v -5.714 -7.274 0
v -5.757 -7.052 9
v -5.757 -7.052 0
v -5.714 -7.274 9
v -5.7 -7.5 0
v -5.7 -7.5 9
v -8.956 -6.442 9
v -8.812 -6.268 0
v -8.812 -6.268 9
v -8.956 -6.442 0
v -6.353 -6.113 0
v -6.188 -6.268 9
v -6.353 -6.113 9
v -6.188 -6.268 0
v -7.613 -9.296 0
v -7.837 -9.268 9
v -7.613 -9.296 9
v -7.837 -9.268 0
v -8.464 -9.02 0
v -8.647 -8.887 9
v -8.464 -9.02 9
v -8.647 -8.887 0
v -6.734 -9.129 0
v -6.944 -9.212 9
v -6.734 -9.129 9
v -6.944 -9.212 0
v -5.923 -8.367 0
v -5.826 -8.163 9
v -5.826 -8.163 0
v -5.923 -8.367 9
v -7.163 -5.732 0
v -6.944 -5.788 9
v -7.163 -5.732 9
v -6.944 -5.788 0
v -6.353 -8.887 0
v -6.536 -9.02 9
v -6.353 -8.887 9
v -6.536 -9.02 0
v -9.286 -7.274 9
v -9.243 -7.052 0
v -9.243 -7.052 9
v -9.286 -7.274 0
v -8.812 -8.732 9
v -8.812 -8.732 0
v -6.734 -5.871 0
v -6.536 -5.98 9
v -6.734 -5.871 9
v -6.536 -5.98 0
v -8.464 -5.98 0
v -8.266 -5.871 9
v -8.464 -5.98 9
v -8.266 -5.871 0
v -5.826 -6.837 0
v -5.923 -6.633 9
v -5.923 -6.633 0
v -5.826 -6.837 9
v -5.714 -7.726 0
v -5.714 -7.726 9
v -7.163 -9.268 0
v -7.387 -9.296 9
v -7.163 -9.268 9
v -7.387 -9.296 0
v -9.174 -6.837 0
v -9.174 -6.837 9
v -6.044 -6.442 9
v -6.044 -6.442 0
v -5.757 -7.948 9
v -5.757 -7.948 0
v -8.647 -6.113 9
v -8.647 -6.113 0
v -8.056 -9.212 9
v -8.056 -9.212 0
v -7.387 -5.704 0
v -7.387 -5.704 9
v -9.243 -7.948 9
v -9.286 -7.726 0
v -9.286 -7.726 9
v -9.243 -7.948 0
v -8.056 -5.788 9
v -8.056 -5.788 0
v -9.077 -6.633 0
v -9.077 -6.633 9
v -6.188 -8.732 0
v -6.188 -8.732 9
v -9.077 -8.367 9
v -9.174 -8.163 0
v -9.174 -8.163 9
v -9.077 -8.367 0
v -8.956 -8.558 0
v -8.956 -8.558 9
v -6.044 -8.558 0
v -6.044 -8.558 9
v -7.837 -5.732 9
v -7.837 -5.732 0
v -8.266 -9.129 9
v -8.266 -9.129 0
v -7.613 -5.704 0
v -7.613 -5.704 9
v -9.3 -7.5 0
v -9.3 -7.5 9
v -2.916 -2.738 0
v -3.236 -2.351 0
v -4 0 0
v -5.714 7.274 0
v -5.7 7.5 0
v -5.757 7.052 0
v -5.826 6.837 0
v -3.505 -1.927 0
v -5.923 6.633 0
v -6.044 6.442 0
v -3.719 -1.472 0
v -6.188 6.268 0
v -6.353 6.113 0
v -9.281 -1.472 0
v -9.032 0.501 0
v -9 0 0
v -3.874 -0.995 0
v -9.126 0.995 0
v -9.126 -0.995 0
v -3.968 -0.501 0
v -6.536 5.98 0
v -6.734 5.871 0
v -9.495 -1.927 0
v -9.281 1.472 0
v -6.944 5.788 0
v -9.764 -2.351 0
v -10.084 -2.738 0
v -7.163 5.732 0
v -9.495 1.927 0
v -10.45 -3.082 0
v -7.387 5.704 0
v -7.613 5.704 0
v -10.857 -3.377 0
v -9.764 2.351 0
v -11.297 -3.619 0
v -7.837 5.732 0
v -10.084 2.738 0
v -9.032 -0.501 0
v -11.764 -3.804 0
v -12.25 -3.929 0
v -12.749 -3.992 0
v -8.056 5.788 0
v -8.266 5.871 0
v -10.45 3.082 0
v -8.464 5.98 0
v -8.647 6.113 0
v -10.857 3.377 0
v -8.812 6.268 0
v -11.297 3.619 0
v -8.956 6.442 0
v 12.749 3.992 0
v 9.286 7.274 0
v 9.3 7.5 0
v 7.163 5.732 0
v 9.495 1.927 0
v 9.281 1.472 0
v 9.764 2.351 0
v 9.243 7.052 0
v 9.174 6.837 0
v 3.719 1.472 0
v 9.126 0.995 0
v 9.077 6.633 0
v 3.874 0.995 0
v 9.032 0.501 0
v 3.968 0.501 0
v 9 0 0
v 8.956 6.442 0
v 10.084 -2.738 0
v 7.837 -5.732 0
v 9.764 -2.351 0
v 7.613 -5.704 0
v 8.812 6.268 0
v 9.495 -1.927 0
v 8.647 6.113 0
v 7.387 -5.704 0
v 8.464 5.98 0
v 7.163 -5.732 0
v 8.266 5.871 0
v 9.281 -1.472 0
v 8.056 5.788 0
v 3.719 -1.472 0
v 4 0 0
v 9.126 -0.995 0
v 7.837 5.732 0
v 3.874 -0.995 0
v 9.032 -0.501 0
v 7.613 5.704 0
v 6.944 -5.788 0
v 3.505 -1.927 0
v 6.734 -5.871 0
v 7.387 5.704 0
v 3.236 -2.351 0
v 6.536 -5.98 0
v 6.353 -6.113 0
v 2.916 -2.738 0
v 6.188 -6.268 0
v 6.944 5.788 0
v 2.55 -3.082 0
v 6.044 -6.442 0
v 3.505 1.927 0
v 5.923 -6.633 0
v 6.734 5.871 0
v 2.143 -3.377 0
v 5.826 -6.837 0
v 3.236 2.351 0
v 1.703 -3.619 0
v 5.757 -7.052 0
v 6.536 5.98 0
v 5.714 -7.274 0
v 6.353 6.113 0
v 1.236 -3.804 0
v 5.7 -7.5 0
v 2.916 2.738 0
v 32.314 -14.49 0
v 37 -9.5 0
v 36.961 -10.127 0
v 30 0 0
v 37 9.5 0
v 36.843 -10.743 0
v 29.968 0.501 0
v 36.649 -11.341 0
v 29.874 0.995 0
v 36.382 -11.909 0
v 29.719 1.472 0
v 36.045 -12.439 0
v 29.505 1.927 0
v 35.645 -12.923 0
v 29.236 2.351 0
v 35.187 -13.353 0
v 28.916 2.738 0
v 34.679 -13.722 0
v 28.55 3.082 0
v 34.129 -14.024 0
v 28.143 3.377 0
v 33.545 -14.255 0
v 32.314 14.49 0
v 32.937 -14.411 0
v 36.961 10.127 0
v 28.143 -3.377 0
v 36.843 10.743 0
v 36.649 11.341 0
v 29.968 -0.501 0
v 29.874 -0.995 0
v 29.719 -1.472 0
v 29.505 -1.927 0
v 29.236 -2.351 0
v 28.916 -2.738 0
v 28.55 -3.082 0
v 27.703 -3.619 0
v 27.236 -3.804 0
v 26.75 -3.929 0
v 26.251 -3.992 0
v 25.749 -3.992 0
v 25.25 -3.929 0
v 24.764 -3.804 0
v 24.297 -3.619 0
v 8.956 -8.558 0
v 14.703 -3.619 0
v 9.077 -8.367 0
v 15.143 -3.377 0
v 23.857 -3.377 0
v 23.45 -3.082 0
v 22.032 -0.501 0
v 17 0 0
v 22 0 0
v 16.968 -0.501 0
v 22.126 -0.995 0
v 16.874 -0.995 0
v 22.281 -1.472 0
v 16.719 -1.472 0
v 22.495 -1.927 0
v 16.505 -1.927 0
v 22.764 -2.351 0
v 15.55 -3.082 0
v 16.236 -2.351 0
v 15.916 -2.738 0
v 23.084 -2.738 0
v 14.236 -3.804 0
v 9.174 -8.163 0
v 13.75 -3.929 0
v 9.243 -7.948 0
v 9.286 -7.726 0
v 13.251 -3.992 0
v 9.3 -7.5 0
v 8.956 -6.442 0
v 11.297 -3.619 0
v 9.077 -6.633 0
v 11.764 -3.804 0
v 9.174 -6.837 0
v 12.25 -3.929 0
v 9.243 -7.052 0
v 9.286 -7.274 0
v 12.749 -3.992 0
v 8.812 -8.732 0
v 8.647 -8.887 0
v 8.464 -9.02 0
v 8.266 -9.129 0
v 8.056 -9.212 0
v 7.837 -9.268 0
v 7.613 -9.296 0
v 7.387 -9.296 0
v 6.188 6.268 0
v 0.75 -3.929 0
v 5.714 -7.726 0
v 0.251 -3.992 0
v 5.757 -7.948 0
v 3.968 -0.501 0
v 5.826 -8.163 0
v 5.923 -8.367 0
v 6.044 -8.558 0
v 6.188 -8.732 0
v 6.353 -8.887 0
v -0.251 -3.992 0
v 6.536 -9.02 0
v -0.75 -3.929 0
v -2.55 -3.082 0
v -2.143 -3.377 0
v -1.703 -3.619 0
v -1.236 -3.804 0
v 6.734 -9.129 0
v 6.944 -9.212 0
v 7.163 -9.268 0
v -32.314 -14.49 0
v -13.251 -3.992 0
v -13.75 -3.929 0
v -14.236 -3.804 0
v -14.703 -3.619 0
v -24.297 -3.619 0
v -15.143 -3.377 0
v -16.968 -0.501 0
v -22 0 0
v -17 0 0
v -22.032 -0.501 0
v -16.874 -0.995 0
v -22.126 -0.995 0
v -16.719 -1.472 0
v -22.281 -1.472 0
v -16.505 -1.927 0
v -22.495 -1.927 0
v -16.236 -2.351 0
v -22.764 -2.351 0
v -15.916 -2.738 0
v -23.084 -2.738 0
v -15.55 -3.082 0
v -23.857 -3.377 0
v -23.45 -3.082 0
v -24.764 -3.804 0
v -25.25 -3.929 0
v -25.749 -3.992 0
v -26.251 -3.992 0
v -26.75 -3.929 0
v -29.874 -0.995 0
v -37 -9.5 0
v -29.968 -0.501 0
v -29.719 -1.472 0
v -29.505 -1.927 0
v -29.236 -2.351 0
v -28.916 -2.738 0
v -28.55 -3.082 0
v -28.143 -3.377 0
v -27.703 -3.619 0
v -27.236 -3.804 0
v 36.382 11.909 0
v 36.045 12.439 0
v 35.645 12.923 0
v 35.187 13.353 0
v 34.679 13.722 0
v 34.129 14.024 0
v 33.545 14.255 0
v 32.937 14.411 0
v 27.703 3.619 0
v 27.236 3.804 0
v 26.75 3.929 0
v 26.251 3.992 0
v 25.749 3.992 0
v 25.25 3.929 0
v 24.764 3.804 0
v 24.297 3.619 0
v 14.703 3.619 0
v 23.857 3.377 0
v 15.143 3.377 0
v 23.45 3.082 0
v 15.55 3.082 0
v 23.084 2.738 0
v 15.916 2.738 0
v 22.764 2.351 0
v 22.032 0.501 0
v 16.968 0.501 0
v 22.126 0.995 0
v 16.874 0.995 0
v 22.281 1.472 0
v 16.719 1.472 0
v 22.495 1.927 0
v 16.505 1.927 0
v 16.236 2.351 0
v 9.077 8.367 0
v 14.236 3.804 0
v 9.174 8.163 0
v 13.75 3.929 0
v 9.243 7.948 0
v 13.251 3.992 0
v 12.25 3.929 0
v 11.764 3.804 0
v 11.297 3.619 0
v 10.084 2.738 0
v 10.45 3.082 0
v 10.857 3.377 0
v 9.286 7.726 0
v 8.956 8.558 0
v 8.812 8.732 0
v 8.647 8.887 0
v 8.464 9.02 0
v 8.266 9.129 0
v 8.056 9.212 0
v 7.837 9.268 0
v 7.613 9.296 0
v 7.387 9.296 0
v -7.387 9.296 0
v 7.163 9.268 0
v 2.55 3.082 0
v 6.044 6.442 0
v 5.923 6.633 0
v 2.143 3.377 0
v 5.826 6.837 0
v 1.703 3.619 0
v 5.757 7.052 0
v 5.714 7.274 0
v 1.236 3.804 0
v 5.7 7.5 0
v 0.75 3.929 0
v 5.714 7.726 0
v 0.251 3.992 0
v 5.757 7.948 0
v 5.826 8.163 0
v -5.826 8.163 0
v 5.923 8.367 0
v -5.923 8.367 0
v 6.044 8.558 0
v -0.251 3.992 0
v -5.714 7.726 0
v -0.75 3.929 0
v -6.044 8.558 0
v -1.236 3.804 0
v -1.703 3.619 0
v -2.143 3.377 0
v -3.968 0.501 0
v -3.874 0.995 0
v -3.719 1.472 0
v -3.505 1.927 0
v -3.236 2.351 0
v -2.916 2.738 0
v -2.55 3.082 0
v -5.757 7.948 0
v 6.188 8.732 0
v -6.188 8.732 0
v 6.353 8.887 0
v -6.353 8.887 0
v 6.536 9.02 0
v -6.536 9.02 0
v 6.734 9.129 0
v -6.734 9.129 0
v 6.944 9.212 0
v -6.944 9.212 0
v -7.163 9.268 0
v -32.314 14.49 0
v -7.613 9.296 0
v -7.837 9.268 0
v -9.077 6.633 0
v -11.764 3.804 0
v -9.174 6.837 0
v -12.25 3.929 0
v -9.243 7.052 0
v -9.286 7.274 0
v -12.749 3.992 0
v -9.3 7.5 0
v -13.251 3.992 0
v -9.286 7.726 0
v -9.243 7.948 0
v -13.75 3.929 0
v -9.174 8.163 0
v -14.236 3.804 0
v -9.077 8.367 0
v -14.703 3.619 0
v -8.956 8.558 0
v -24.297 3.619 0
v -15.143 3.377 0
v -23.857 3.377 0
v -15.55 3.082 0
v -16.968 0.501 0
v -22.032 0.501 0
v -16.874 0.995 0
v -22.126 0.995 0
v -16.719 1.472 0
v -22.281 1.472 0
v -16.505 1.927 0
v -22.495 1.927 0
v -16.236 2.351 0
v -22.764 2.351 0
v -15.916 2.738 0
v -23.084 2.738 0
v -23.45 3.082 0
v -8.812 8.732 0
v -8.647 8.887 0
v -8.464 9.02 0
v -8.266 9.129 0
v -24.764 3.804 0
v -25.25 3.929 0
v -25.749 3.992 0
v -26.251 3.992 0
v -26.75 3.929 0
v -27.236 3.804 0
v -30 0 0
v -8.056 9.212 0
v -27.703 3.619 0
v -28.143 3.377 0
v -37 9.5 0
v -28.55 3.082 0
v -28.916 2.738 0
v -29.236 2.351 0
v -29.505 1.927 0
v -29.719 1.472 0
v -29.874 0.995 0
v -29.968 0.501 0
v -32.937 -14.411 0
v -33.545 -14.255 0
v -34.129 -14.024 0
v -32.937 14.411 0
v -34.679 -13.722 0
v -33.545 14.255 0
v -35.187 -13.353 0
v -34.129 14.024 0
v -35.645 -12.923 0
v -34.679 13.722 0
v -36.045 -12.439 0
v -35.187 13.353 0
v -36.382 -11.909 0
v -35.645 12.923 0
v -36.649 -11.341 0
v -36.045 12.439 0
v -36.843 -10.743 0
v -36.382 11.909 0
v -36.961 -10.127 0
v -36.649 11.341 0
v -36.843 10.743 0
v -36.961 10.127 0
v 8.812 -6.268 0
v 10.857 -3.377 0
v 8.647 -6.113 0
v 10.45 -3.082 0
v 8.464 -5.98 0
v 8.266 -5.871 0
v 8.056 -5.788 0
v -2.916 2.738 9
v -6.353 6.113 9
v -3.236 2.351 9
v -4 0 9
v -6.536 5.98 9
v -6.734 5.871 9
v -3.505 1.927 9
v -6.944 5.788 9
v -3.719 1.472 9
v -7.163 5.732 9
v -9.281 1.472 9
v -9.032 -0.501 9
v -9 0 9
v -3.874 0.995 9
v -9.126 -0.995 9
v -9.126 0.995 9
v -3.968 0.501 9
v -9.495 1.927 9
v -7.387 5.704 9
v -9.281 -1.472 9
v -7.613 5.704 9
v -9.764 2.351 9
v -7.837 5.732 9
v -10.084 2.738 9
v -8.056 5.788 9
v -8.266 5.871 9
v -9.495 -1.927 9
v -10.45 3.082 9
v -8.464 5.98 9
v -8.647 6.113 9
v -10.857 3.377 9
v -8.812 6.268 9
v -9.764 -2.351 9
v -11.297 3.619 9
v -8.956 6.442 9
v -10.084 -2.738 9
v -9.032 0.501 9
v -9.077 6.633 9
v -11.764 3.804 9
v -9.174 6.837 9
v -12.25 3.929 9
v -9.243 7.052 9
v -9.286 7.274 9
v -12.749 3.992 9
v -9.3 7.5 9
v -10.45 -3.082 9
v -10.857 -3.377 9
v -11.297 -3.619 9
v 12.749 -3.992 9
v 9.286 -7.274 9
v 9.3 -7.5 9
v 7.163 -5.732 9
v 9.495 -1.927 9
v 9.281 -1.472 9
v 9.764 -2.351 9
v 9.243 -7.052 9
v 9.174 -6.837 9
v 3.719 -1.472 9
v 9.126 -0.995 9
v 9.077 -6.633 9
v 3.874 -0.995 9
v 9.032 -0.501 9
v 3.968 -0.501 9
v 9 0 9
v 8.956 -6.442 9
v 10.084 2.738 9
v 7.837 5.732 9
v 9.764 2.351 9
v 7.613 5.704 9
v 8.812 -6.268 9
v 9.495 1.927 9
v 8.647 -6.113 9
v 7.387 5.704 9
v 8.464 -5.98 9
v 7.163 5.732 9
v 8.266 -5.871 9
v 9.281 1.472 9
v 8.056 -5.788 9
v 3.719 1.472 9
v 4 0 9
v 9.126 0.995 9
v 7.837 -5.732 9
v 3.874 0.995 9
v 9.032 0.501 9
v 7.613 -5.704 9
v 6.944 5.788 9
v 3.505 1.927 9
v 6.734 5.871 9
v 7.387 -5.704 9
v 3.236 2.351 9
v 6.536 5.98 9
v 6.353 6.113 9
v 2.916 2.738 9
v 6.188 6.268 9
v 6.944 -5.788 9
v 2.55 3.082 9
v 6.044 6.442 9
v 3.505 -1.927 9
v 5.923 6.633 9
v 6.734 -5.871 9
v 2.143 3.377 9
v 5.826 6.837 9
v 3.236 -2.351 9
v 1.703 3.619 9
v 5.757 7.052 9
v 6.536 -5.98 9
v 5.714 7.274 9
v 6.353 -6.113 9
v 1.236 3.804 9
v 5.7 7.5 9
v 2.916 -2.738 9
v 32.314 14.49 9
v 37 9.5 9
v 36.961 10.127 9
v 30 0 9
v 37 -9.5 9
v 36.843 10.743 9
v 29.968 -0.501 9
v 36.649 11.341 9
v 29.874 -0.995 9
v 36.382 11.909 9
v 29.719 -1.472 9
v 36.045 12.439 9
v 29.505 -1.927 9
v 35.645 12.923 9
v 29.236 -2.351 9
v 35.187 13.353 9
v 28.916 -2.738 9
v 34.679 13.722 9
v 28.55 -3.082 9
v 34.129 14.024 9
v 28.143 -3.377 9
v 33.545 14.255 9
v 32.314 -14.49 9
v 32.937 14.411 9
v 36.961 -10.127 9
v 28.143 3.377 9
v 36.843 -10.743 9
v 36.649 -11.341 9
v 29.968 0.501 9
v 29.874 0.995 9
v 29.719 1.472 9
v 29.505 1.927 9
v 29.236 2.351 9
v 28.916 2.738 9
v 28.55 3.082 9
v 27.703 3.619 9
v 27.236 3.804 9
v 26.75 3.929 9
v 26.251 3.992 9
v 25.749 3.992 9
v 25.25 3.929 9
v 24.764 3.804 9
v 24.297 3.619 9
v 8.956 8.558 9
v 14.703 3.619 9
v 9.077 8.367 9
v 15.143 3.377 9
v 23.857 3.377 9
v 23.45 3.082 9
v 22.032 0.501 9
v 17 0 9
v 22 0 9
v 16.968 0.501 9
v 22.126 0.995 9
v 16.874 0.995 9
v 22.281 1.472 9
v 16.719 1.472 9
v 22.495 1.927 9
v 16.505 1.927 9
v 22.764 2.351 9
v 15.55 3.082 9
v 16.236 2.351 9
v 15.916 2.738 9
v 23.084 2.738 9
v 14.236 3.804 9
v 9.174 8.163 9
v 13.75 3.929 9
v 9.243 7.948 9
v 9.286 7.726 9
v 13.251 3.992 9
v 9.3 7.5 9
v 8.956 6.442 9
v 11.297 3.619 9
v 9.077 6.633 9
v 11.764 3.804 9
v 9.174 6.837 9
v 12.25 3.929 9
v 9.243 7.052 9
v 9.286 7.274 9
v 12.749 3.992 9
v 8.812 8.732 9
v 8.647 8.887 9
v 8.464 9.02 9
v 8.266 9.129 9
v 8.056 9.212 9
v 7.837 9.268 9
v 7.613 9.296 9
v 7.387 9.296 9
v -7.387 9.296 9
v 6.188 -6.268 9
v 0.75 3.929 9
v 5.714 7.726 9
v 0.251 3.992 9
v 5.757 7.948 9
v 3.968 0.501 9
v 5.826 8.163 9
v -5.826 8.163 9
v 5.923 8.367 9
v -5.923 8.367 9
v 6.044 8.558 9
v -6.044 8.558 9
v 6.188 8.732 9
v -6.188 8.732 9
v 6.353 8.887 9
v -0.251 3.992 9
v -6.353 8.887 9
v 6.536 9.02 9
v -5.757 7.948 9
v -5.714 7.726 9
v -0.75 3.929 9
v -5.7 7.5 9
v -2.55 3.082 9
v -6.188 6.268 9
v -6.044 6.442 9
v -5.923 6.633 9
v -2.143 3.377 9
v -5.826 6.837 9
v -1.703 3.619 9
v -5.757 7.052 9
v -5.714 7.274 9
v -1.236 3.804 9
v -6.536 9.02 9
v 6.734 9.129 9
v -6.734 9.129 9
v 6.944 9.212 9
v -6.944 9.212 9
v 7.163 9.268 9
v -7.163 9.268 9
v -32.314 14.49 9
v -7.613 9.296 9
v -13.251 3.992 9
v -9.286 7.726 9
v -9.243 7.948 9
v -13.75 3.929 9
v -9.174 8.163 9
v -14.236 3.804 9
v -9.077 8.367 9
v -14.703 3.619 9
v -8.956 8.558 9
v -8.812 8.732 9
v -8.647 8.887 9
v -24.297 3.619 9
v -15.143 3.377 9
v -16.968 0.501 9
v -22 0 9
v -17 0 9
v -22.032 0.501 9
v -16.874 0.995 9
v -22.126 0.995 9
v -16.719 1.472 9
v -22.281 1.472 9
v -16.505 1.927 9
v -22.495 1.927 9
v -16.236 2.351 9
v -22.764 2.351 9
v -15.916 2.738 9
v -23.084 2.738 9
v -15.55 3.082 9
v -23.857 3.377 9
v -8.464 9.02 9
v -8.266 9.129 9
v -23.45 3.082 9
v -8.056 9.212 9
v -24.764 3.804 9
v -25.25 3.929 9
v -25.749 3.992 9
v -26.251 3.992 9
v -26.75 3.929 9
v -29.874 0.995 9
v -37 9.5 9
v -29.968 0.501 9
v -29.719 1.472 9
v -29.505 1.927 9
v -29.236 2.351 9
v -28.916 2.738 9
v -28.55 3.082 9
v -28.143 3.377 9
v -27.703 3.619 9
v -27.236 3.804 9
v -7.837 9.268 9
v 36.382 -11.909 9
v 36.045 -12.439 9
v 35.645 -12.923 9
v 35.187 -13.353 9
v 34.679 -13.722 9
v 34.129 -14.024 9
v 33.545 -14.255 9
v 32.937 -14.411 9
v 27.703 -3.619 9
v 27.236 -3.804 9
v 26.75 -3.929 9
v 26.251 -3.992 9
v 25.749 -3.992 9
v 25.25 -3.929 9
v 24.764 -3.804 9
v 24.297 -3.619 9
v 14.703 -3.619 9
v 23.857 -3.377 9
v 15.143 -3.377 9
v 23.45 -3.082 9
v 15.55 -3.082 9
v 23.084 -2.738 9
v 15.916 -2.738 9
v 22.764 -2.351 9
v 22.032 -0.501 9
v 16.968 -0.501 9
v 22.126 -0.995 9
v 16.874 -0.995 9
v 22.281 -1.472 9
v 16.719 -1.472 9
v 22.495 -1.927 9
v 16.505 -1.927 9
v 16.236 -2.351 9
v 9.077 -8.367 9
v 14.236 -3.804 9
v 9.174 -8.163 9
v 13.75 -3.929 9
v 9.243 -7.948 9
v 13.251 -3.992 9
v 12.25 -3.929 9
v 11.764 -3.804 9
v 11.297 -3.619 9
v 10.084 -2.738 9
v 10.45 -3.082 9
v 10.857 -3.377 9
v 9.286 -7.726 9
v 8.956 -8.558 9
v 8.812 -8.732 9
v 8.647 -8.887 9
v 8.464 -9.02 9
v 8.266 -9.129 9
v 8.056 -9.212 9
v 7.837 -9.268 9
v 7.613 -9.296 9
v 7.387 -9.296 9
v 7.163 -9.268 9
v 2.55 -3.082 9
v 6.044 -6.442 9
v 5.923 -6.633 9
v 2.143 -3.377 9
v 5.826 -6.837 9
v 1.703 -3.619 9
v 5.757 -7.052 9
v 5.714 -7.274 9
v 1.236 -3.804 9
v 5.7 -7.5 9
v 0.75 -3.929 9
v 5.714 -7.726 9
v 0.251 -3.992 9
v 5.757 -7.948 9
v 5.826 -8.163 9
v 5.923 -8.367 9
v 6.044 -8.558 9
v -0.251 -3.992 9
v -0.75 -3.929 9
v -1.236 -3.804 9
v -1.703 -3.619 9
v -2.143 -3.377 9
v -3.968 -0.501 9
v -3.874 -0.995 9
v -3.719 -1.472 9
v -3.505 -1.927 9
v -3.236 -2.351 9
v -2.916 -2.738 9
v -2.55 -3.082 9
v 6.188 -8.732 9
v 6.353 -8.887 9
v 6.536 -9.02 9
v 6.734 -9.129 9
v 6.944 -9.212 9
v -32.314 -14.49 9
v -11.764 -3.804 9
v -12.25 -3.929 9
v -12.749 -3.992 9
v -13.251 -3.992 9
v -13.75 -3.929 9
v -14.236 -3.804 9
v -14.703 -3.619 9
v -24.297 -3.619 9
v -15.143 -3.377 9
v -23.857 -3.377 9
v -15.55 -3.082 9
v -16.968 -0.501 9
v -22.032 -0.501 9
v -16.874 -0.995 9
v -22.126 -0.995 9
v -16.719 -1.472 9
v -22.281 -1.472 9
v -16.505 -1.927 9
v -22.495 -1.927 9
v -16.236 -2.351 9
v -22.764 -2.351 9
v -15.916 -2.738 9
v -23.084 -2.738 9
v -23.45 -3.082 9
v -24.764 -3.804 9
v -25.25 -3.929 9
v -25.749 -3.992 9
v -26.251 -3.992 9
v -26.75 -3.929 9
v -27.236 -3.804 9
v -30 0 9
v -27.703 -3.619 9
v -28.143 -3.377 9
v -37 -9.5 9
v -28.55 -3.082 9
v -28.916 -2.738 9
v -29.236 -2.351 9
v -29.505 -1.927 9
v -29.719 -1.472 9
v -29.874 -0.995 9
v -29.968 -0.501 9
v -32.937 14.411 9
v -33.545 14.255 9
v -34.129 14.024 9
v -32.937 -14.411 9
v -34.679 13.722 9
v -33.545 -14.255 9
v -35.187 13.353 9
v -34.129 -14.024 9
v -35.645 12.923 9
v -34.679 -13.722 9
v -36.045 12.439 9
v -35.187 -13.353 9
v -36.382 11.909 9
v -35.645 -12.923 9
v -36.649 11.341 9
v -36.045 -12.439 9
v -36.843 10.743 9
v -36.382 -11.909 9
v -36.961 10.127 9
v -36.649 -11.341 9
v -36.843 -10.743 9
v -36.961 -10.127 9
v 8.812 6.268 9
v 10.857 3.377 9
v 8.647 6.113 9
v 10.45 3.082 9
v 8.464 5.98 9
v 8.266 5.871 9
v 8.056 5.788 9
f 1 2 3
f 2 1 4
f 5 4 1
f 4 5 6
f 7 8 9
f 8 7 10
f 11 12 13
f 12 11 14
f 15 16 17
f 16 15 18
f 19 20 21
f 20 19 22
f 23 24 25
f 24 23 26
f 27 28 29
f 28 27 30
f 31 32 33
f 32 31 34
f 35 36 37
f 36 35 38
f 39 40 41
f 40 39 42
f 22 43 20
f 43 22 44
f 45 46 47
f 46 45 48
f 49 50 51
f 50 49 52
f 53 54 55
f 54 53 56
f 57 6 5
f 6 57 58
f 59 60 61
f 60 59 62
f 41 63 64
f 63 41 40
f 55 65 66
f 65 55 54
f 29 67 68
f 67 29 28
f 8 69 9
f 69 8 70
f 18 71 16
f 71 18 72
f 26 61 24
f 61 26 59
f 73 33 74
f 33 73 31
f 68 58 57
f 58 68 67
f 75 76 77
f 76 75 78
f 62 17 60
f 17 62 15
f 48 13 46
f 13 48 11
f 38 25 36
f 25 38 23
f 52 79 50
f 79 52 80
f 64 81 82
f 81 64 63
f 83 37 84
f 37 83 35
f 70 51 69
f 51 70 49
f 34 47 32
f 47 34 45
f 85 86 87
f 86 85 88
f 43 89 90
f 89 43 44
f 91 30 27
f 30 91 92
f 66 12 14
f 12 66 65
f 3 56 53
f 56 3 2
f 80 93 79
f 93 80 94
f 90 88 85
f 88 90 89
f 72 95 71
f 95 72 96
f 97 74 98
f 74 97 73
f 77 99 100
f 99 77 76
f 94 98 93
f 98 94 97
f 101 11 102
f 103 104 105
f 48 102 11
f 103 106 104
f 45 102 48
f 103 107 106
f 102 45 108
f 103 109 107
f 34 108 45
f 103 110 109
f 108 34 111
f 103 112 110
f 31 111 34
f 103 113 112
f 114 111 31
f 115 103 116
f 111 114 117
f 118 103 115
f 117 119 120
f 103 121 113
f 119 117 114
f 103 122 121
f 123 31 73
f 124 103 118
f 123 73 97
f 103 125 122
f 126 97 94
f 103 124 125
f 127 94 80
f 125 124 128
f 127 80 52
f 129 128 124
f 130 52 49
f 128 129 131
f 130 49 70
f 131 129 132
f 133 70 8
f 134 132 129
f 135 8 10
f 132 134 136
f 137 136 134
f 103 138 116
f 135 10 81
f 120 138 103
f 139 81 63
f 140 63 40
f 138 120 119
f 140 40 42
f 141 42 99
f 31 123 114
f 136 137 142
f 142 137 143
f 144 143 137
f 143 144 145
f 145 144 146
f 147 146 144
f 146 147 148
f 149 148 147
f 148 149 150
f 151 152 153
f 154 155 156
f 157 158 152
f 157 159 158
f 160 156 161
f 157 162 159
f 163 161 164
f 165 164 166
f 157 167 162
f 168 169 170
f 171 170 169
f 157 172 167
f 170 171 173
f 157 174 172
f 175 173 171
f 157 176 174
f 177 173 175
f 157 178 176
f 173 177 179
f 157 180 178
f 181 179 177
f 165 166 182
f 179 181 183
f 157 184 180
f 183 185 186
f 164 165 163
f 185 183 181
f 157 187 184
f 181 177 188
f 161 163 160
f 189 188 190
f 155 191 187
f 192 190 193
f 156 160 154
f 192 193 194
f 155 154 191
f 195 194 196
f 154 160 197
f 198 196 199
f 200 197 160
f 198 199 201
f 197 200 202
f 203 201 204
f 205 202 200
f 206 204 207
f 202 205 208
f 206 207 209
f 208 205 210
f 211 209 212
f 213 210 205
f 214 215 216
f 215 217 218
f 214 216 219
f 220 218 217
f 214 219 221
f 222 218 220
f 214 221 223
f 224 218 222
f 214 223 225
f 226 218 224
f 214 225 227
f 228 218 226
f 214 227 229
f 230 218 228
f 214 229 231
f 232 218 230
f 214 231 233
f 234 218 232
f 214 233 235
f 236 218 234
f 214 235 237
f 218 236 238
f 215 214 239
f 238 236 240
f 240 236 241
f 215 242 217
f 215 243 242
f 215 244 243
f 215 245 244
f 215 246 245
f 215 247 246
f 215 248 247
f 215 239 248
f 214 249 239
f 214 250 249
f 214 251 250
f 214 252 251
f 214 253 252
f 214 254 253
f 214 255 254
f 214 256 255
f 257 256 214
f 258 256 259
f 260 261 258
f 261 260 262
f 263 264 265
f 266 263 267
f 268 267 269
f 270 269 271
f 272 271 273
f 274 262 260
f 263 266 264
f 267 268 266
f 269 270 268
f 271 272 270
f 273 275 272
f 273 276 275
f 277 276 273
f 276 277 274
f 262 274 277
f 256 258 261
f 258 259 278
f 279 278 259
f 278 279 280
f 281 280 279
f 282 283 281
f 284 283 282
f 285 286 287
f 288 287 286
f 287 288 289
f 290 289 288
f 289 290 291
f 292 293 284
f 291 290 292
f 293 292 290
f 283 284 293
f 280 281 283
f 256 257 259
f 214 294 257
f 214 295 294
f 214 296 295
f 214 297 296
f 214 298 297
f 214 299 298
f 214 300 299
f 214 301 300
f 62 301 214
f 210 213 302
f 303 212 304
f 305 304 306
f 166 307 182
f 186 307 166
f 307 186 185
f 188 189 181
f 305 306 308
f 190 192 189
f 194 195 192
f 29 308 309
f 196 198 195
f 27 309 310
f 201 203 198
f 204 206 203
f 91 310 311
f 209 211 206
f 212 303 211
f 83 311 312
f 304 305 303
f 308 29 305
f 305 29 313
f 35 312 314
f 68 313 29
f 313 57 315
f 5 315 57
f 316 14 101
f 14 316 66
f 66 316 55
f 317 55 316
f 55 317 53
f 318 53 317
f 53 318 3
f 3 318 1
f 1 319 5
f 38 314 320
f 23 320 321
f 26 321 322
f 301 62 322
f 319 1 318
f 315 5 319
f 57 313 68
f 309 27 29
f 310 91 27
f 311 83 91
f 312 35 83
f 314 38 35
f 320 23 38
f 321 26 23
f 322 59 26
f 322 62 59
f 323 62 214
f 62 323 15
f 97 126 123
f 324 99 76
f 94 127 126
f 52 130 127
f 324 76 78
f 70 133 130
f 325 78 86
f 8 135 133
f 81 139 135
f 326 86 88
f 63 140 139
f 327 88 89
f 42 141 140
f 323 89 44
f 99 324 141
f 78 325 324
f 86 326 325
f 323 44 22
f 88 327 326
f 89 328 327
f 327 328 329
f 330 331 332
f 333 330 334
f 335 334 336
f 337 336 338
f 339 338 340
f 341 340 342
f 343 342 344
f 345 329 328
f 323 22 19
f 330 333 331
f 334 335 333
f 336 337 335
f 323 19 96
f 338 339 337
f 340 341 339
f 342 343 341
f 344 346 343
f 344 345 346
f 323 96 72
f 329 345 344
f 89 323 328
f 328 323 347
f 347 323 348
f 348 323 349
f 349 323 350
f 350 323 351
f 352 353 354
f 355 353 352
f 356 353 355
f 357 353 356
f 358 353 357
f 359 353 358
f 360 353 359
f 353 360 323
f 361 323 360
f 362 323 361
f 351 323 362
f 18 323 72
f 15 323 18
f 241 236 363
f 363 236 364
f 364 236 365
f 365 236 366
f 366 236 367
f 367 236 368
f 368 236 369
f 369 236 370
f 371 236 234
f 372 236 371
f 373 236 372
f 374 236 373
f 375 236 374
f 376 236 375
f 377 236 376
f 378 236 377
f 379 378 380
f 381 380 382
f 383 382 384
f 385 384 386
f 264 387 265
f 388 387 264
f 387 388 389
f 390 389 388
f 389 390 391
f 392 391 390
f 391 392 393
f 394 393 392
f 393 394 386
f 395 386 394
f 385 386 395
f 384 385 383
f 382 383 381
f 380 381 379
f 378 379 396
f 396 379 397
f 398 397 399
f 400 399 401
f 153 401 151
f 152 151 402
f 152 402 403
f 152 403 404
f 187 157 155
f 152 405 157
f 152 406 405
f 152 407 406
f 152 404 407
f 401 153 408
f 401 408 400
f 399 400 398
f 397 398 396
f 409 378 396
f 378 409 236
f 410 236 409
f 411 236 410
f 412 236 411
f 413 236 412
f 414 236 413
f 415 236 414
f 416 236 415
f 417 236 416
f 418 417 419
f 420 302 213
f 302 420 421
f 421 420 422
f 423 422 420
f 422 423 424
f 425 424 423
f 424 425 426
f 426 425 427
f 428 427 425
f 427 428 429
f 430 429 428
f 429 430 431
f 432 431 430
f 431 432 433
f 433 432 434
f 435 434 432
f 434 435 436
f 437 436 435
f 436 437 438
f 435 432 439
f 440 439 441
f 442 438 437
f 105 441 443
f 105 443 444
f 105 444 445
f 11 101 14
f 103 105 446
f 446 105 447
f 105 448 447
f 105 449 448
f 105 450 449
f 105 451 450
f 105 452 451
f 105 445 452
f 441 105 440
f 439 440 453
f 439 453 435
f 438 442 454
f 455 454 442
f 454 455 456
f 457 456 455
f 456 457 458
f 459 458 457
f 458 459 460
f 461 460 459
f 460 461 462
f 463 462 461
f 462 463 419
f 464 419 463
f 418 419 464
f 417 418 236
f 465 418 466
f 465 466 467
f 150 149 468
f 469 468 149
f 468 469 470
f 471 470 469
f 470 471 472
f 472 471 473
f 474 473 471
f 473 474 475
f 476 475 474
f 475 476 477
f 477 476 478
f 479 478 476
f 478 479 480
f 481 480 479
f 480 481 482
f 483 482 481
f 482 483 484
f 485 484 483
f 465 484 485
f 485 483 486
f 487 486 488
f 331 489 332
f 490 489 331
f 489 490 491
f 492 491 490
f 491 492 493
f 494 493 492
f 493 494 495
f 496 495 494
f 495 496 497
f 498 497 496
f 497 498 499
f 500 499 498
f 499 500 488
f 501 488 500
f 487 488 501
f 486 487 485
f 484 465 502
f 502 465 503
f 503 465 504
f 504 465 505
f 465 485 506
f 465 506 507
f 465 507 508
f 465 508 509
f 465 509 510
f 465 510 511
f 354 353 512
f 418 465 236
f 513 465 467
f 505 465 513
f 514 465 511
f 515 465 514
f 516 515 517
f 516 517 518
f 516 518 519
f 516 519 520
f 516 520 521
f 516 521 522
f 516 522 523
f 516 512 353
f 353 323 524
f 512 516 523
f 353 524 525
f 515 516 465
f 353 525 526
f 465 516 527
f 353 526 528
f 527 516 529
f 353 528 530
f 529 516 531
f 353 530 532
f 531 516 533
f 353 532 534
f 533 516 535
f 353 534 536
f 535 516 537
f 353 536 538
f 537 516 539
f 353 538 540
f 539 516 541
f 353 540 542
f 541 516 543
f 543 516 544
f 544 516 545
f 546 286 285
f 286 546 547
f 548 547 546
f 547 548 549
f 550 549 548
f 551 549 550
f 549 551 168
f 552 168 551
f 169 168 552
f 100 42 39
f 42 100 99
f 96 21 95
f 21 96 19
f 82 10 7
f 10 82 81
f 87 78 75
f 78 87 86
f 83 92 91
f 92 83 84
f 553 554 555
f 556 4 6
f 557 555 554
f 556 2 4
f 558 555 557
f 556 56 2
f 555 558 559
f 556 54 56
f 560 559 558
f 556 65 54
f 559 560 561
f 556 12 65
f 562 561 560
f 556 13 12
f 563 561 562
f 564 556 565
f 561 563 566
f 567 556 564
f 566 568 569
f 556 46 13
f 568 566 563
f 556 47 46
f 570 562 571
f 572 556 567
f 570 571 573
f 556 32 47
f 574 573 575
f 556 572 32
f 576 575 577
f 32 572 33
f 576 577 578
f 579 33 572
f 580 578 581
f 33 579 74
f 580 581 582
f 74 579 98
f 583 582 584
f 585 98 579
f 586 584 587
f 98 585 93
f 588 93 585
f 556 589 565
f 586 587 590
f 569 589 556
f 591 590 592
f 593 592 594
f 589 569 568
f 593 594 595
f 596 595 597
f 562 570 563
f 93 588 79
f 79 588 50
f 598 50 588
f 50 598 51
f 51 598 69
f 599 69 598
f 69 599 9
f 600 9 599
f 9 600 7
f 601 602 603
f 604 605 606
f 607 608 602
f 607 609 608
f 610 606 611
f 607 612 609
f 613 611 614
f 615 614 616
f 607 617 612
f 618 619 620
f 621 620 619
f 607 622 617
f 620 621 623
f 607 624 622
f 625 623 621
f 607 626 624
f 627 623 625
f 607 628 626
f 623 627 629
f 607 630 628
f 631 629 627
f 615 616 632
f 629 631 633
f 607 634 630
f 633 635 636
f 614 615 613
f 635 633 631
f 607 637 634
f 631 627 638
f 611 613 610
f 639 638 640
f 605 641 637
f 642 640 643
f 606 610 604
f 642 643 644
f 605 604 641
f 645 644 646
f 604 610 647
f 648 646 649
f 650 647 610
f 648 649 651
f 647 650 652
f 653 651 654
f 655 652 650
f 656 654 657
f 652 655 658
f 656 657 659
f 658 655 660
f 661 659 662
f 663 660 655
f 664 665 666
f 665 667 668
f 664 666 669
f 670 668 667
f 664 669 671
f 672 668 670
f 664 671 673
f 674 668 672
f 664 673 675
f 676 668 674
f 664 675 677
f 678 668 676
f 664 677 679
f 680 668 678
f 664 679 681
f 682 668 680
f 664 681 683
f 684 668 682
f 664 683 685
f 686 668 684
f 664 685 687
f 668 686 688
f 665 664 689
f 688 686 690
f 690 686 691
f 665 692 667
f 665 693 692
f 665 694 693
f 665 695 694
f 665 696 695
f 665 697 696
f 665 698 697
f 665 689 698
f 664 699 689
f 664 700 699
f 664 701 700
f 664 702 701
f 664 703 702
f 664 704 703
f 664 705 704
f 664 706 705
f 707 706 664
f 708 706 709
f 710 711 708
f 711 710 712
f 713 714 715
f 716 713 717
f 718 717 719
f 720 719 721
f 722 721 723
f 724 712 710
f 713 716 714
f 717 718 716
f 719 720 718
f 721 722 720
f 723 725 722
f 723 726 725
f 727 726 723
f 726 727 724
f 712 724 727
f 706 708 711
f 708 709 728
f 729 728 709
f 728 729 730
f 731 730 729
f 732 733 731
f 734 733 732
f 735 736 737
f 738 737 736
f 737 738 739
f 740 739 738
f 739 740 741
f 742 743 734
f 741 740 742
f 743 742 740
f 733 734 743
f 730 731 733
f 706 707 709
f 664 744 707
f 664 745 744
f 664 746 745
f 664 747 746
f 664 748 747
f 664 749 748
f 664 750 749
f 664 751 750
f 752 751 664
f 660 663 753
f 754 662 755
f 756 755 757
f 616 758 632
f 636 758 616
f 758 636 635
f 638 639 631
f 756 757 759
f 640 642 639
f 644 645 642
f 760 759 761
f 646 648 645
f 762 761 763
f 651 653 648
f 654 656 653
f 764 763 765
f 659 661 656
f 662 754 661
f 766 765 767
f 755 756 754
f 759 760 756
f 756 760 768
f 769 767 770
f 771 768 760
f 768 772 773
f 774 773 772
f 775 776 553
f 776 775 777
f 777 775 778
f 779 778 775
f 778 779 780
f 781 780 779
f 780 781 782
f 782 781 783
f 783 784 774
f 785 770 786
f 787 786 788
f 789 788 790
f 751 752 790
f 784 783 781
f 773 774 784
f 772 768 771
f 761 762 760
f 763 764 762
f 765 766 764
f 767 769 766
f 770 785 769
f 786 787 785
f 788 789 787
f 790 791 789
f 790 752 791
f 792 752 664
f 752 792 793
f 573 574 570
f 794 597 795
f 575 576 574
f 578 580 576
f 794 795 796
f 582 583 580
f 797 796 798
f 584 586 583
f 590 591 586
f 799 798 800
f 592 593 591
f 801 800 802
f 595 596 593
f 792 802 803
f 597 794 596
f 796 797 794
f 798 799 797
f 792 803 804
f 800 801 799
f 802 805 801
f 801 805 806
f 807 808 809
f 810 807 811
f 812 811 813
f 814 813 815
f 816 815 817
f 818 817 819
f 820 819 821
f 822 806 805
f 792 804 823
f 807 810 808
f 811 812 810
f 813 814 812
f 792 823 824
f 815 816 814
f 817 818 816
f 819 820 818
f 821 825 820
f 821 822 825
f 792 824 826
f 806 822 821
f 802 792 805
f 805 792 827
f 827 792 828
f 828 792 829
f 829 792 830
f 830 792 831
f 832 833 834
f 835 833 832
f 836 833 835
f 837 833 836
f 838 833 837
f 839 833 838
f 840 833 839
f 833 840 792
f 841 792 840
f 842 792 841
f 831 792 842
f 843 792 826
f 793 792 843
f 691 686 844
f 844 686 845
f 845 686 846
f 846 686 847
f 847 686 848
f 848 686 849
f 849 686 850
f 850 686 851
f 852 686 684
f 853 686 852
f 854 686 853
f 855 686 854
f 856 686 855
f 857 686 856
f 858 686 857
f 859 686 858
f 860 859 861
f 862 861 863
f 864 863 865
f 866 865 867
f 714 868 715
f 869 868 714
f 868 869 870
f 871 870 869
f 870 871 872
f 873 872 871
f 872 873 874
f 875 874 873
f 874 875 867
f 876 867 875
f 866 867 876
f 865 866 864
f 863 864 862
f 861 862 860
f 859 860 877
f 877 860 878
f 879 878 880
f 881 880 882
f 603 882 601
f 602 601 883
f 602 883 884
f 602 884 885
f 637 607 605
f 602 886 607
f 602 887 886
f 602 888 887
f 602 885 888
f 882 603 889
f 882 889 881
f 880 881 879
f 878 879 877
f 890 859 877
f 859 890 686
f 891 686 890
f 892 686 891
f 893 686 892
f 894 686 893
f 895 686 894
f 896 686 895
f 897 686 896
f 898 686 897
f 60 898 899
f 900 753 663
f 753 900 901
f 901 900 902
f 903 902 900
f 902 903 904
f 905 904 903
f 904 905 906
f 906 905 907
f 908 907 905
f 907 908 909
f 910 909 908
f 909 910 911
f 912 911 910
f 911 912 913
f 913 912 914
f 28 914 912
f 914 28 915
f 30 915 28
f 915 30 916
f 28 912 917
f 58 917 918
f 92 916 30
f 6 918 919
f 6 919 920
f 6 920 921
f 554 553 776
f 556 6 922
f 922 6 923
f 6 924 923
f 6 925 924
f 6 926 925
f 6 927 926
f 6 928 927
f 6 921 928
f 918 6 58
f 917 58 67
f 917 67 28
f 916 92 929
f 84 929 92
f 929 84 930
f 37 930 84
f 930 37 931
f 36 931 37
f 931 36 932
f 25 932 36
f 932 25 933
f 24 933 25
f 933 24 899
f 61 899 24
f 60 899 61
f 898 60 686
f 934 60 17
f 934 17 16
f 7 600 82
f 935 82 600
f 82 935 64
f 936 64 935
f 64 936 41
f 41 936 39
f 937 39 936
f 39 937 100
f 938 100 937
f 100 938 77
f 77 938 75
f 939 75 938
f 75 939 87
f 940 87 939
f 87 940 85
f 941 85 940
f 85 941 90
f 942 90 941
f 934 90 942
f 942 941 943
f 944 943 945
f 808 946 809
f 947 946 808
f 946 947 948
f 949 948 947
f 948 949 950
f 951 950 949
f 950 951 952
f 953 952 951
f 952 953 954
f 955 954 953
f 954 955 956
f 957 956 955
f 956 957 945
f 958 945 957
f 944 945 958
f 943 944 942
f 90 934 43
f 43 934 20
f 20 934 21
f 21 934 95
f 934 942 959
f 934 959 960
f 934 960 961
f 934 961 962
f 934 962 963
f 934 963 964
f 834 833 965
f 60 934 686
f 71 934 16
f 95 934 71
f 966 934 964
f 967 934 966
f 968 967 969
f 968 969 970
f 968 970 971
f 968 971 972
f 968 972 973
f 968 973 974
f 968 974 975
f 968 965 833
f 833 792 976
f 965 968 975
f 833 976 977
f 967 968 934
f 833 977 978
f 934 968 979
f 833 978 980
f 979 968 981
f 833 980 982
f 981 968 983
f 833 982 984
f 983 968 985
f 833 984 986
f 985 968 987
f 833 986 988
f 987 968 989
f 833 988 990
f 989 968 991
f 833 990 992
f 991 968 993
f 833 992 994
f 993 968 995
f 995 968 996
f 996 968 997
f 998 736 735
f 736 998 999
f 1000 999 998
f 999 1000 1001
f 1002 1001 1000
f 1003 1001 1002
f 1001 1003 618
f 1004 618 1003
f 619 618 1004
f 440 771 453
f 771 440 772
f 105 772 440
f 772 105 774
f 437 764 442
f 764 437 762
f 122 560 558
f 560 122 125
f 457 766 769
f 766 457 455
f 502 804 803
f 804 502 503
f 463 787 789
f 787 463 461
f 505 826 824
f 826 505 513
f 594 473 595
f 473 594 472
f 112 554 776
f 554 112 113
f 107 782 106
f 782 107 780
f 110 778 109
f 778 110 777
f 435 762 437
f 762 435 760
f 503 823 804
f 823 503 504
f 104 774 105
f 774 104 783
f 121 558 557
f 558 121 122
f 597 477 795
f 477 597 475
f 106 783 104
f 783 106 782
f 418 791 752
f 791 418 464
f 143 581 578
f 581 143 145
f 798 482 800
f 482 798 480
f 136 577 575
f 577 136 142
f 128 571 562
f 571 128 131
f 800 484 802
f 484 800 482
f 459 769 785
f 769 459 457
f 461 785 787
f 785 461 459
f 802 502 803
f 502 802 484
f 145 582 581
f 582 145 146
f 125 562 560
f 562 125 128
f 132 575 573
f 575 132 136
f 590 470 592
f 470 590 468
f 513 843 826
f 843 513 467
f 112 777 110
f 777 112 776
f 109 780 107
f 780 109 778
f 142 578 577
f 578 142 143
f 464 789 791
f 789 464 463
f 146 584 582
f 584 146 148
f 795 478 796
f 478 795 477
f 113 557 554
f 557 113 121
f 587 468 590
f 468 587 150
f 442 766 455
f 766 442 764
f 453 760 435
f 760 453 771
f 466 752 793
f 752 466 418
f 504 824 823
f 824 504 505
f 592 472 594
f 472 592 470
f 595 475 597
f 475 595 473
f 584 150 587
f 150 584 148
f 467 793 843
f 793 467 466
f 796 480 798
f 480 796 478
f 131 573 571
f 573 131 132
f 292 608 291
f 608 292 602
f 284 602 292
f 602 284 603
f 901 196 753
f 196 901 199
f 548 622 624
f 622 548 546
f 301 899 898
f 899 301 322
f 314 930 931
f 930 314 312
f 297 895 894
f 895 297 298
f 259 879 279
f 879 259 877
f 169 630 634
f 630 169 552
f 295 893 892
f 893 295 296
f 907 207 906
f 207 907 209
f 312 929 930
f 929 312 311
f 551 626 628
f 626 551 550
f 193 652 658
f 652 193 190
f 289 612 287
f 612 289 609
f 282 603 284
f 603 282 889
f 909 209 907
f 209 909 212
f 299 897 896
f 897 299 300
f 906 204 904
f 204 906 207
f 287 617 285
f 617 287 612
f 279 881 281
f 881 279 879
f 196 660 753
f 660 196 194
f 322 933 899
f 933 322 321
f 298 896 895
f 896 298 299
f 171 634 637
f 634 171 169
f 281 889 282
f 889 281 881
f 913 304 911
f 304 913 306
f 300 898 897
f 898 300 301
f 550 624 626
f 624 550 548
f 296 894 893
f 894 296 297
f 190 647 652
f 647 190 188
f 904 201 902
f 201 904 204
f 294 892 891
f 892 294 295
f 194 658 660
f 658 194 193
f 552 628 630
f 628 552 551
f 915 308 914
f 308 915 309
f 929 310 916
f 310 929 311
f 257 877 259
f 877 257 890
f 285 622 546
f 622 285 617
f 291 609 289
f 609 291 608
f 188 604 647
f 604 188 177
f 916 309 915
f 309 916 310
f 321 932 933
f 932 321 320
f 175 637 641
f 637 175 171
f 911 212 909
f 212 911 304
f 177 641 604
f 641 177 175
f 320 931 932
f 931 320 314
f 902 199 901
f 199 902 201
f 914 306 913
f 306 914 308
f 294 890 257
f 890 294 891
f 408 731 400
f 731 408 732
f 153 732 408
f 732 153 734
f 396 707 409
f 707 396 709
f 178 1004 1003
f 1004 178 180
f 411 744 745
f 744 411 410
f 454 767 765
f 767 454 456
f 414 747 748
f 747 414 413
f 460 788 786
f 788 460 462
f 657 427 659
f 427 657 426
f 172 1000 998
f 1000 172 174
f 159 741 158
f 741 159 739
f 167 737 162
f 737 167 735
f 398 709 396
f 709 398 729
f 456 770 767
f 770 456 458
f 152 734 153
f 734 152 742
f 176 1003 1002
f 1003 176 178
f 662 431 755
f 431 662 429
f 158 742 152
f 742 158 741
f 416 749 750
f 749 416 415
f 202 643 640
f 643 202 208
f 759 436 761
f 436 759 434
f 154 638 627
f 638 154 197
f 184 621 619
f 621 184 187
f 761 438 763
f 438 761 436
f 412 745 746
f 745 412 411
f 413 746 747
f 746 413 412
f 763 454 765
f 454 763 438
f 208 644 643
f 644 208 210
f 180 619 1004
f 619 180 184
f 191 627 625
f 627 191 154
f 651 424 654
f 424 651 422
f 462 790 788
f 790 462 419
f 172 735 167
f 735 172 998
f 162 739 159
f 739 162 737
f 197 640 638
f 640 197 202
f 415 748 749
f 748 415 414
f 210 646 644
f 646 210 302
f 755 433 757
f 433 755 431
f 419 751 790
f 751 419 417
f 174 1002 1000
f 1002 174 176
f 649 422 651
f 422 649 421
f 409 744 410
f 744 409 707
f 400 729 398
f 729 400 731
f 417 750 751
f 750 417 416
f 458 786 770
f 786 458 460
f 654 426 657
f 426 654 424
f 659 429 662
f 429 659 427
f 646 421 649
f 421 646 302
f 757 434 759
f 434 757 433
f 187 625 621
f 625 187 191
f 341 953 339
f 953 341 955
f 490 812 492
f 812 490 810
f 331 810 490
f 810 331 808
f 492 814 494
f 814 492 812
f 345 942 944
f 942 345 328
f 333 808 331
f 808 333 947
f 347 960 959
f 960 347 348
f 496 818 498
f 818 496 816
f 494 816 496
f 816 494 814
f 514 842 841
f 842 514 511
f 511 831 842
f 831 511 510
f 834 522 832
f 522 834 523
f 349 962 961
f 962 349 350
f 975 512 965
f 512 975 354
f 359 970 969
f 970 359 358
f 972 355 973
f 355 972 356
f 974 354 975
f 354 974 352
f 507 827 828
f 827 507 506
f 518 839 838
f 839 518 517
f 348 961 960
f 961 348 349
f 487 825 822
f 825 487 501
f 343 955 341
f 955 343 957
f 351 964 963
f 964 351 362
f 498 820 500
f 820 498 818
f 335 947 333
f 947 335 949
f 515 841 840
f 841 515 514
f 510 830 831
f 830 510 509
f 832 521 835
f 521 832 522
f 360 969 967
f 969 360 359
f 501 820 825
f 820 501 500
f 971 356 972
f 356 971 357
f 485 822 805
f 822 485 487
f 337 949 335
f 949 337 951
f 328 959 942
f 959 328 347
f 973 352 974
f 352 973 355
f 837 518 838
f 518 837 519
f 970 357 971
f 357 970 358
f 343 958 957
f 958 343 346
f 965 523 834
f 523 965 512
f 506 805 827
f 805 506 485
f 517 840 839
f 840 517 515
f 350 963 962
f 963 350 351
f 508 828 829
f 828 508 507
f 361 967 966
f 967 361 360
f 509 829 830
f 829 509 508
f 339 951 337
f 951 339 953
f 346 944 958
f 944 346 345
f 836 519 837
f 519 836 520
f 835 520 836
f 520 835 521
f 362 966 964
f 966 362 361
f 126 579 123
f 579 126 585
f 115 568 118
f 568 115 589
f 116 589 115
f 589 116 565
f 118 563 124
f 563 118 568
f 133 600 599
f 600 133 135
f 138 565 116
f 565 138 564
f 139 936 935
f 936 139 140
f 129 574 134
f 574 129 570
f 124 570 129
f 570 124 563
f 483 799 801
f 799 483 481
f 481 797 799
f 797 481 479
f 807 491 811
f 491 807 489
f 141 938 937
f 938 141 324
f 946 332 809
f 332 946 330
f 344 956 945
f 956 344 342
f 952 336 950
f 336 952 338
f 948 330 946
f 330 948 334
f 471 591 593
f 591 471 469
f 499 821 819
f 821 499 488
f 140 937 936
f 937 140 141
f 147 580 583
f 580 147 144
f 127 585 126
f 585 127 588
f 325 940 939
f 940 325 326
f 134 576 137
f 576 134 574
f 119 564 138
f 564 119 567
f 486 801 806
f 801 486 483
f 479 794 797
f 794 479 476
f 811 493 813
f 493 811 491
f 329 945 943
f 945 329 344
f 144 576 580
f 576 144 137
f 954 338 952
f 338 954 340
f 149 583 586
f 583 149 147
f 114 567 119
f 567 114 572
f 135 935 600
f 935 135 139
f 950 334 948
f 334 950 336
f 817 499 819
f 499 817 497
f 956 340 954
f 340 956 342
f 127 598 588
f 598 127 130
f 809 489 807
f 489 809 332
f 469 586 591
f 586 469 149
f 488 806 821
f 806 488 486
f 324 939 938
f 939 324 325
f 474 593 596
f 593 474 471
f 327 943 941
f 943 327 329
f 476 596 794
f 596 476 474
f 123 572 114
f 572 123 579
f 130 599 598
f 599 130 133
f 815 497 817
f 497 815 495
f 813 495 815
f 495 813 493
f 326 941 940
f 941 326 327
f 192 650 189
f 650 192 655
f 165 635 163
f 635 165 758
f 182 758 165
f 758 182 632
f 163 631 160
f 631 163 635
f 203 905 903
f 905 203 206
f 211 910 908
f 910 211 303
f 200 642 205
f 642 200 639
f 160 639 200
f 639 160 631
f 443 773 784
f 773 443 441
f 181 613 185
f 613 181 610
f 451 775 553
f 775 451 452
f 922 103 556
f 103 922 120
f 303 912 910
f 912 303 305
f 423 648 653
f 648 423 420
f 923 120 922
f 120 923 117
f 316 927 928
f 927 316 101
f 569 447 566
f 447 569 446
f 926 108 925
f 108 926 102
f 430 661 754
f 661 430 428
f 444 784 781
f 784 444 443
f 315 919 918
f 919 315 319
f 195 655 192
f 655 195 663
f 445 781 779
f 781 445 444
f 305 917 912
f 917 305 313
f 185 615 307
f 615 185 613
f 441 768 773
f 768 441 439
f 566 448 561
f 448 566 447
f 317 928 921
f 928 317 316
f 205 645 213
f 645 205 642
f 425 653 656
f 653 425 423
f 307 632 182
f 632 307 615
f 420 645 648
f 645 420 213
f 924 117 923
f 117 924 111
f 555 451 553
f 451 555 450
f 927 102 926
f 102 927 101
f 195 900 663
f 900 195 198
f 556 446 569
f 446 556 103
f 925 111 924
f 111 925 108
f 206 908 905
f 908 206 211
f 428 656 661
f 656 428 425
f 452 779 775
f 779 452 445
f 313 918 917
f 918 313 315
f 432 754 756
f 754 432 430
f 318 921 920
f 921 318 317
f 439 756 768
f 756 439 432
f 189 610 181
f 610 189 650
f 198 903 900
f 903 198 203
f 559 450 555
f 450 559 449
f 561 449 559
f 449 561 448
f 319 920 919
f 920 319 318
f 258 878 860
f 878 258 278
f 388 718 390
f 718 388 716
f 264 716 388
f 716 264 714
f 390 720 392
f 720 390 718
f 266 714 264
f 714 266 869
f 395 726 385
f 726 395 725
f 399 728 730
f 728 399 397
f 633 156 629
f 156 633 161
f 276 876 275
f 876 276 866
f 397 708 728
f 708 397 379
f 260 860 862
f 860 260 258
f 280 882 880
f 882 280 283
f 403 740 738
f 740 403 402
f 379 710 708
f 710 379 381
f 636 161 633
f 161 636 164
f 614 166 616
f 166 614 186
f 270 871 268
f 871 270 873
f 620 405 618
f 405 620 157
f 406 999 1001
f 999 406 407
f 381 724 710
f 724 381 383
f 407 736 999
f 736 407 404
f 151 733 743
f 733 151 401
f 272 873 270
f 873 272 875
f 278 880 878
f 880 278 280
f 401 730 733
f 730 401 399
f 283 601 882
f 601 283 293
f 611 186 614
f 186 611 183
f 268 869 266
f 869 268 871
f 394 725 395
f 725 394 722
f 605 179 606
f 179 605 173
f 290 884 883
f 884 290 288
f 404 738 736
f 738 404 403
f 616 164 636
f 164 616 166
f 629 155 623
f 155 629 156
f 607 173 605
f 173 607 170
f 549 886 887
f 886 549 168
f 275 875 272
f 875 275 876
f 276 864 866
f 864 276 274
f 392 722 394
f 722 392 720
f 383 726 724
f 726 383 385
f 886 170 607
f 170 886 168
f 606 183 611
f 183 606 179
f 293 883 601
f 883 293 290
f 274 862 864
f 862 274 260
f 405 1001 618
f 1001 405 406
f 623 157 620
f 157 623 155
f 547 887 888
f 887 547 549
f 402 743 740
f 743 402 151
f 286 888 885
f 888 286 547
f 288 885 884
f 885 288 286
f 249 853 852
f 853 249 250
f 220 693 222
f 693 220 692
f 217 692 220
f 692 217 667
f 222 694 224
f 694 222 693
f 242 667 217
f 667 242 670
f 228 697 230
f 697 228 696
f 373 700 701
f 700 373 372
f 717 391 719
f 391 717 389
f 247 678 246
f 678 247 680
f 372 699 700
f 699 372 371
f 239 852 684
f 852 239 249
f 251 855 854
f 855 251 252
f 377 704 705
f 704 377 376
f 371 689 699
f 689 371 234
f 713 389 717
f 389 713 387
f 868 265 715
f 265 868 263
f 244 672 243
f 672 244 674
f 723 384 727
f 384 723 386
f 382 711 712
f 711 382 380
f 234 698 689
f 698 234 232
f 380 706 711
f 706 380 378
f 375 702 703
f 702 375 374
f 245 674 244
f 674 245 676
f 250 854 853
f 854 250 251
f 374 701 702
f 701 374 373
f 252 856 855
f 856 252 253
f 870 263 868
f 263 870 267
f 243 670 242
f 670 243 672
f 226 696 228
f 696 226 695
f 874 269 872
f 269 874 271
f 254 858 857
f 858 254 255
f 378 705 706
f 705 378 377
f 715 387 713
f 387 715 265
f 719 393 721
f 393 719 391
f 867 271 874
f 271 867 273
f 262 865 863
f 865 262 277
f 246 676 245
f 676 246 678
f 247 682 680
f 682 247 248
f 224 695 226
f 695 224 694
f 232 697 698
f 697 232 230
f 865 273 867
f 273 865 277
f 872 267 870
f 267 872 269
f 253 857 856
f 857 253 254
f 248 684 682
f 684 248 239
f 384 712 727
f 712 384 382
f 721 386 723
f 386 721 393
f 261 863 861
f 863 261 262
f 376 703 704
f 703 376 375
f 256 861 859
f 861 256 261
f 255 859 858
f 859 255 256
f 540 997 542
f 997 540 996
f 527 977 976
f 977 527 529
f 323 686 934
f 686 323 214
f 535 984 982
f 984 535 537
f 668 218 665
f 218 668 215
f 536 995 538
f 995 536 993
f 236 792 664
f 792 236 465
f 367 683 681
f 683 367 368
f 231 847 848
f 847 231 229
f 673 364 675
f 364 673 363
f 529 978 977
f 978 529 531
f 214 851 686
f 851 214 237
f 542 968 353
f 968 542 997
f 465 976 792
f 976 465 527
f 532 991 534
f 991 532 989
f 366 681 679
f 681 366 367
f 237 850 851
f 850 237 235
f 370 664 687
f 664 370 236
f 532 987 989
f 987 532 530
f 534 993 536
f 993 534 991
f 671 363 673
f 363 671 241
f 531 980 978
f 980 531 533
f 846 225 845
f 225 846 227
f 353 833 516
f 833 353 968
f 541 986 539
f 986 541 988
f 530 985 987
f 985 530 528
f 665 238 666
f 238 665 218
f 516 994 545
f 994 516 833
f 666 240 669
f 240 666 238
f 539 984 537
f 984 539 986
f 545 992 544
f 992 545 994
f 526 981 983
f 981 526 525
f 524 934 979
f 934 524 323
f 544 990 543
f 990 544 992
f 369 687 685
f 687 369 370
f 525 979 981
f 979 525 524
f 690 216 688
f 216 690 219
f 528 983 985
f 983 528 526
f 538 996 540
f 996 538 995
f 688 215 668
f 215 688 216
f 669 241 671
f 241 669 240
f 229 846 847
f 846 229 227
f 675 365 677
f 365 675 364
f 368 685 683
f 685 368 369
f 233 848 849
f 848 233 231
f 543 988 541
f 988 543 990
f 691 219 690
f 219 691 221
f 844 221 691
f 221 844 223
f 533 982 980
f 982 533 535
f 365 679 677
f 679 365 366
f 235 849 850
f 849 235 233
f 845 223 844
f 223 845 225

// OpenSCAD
$fn = 50;

difference() {
	union() {
		hull() {
			translate(v = [-32.0, 9.5, 0]) {
				cylinder(h = 9, r = 5);
			}
			translate(v = [32.0, 9.5, 0]) {
				cylinder(h = 9, r = 5);
			}
			translate(v = [-32.0, -9.5, 0]) {
				cylinder(h = 9, r = 5);
			}
			translate(v = [32.0, -9.5, 0]) {
				cylinder(h = 9, r = 5);
			}
		}
	}
	union() {
		translate(v = [-7.5, -7.5, 0]) {
			cylinder(h = 9, r = 1.8);
		}
		translate(v = [-7.5, 7.5, 0]) {
			cylinder(h = 9, r = 1.8);
		}
		translate(v = [7.5, -7.5, 0]) {
			cylinder(h = 9, r = 1.8);
		}
		translate(v = [7.5, 7.5, 0]) {
			cylinder(h = 9, r = 1.8);
		}
		translate(v = [-26.0, 0, 0.0]) {
			cylinder(h = 9, r = 4.0);
		}
		translate(v = [-13.0, 0, 0.0]) {
			cylinder(h = 9, r = 4.0);
		}
		cylinder(h = 9, r = 4.0);
		translate(v = [13.0, 0, 0.0]) {
			cylinder(h = 9, r = 4.0);
		}
		translate(v = [26.0, 0, 0.0]) {
			cylinder(h = 9, r = 4.0);
		}
	}
}
